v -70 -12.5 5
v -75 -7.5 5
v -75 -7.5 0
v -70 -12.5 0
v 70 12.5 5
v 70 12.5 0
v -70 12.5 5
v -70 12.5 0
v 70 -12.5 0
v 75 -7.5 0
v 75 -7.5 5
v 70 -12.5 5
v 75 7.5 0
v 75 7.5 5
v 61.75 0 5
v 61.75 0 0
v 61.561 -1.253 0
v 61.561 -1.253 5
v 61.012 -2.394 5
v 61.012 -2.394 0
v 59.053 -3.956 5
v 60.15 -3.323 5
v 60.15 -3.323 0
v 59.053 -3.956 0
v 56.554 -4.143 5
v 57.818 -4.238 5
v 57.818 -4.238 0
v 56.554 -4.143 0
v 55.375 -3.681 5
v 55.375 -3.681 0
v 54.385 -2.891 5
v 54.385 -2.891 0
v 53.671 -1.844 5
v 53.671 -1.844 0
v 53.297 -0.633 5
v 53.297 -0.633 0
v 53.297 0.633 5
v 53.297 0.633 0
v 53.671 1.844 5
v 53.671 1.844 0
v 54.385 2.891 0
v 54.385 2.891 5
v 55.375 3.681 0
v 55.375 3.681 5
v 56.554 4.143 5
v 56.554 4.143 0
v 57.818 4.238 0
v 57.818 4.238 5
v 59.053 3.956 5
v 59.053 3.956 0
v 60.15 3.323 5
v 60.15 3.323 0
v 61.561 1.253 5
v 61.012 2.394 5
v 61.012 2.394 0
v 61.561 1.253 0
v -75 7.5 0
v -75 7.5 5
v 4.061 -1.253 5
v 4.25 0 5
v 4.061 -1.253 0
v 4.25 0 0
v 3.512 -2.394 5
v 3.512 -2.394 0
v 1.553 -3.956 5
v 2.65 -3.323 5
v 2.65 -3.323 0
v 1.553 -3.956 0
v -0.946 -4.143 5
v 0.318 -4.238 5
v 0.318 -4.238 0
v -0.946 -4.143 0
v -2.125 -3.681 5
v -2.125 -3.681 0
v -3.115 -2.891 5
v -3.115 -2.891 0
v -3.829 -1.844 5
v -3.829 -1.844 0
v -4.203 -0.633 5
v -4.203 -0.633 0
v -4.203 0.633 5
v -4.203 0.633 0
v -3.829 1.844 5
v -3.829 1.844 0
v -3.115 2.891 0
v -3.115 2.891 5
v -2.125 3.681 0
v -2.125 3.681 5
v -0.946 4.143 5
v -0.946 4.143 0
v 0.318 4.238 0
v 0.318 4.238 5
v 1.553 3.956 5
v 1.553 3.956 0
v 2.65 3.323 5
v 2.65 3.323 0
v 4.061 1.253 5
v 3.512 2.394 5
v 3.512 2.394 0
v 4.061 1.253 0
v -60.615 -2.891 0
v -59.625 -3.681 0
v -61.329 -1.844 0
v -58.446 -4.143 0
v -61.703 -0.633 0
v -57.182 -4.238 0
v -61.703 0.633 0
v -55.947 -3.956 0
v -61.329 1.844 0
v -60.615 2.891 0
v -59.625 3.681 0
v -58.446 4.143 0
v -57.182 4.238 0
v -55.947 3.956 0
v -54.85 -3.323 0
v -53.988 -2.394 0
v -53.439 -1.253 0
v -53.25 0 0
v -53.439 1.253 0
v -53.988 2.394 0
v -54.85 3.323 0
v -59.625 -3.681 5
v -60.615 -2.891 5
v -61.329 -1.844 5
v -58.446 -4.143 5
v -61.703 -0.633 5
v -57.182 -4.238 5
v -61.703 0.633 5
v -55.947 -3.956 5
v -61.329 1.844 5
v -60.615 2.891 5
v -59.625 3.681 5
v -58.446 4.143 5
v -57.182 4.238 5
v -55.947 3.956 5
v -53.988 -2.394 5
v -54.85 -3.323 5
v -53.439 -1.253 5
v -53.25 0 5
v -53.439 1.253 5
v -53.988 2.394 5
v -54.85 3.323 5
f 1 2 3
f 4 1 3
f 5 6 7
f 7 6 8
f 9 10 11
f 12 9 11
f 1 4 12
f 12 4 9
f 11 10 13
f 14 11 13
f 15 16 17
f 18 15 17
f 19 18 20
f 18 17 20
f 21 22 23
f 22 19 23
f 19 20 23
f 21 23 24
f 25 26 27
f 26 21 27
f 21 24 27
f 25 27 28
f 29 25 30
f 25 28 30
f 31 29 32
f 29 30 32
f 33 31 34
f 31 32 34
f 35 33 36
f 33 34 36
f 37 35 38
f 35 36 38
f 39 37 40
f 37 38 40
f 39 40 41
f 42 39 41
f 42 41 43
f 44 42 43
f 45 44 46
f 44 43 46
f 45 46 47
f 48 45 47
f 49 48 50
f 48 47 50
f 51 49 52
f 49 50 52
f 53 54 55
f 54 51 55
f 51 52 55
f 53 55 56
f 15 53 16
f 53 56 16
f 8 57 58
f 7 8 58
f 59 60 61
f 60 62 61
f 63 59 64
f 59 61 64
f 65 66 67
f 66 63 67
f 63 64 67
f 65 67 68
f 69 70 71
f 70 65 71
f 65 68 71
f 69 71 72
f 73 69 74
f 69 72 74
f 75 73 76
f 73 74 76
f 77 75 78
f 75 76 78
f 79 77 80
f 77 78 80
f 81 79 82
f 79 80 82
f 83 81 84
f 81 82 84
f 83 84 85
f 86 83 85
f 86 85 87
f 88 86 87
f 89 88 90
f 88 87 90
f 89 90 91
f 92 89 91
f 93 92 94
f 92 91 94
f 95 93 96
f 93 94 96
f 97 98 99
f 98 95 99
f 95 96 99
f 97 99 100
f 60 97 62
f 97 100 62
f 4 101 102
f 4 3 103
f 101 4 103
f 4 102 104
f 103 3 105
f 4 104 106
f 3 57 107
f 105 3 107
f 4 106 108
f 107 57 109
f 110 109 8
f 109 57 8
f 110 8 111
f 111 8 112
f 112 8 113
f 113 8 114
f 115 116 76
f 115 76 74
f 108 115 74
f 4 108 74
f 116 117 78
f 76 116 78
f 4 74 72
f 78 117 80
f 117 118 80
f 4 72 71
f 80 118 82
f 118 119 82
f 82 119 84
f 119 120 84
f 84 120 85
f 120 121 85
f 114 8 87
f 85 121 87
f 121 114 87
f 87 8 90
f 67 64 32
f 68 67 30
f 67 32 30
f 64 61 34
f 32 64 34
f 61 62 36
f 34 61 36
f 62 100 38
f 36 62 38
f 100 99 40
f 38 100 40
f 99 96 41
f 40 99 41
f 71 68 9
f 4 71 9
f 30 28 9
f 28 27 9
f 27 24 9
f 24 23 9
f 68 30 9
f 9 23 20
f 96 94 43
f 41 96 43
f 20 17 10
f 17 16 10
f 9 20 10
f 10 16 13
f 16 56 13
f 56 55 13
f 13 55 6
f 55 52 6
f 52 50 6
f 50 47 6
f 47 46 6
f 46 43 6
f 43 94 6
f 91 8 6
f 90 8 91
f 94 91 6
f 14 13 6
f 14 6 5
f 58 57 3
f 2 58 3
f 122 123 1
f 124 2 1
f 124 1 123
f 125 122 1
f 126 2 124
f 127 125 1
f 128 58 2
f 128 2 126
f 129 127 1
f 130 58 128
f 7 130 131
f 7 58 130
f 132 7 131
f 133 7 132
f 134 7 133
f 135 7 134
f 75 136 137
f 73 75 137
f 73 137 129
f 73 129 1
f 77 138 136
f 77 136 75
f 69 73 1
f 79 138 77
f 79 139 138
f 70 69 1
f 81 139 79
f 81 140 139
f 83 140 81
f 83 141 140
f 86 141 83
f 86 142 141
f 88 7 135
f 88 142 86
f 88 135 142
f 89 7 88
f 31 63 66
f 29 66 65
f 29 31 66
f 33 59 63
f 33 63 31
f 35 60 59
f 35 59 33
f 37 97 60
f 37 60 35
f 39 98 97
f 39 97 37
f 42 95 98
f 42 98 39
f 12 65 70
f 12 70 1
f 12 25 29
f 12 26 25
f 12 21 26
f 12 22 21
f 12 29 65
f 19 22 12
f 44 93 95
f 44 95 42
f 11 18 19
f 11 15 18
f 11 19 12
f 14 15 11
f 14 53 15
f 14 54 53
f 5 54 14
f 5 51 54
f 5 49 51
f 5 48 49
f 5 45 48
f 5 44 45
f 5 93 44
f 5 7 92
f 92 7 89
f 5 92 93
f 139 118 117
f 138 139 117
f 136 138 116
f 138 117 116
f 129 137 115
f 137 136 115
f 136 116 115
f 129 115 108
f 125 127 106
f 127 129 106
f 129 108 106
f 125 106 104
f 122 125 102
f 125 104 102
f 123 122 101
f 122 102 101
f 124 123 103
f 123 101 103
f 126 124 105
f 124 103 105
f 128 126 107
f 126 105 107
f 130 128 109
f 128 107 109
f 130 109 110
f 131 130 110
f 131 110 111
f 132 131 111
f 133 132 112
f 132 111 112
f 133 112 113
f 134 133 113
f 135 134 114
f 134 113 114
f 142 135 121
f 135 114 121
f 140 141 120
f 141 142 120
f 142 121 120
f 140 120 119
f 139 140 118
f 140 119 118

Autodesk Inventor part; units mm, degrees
ref_plane "YZ Plane" through (0, 0, 0) normal (1, 0, 0) x (0, 1, 0)
ref_plane "XZ Plane" through (0, 0, 0) normal (0, 1, 0) x (-1, 0, 0)
ref_plane "XY Plane" through (0, 0, 0) normal (0, 0, 1) x (1, 0, 0)
sketch "Sketch1" plane through (0, 0, 0) normal (0, 0, 1) x (1, 0, 0)
  line L0 (-75, -12.5) -> (75, -12.5)
  line L1 (75, -12.5) -> (75, 12.5)
  line L2 (75, 12.5) -> (-75, 12.5)
  line L3 (-75, 12.5) -> (-75, -12.5)
  line L4 (-75, -12.5) -> (75, 12.5) construction
  line L5 (75, -12.5) -> (-75, 12.5) construction
  circle A0 centre (-57.5, 0) radius 4.25
  circle A1 centre (0, 0) radius 4.25
  circle A2 centre (57.5, 0) radius 4.25
  line L6 (-57.5, 0) -> (57.5, 0) construction
  dimension "d0" = 150
  dimension "d1" = 25
  dimension "d3" = 115
  dimension "d4" = 8.5
extrude "Extrusion1" add sketch "Sketch1" along normal blind 5
chamfer "Chamfer1" distance 5 angle 45 4 edges at (-75, 12.5, 2.5) (-75, -12.5, 2.5) (75, -12.5, 2.5) (75, 12.5, 2.5)
properties part number "GUIA_DE_AYUDA" material "Steel, Mild, Welded"
